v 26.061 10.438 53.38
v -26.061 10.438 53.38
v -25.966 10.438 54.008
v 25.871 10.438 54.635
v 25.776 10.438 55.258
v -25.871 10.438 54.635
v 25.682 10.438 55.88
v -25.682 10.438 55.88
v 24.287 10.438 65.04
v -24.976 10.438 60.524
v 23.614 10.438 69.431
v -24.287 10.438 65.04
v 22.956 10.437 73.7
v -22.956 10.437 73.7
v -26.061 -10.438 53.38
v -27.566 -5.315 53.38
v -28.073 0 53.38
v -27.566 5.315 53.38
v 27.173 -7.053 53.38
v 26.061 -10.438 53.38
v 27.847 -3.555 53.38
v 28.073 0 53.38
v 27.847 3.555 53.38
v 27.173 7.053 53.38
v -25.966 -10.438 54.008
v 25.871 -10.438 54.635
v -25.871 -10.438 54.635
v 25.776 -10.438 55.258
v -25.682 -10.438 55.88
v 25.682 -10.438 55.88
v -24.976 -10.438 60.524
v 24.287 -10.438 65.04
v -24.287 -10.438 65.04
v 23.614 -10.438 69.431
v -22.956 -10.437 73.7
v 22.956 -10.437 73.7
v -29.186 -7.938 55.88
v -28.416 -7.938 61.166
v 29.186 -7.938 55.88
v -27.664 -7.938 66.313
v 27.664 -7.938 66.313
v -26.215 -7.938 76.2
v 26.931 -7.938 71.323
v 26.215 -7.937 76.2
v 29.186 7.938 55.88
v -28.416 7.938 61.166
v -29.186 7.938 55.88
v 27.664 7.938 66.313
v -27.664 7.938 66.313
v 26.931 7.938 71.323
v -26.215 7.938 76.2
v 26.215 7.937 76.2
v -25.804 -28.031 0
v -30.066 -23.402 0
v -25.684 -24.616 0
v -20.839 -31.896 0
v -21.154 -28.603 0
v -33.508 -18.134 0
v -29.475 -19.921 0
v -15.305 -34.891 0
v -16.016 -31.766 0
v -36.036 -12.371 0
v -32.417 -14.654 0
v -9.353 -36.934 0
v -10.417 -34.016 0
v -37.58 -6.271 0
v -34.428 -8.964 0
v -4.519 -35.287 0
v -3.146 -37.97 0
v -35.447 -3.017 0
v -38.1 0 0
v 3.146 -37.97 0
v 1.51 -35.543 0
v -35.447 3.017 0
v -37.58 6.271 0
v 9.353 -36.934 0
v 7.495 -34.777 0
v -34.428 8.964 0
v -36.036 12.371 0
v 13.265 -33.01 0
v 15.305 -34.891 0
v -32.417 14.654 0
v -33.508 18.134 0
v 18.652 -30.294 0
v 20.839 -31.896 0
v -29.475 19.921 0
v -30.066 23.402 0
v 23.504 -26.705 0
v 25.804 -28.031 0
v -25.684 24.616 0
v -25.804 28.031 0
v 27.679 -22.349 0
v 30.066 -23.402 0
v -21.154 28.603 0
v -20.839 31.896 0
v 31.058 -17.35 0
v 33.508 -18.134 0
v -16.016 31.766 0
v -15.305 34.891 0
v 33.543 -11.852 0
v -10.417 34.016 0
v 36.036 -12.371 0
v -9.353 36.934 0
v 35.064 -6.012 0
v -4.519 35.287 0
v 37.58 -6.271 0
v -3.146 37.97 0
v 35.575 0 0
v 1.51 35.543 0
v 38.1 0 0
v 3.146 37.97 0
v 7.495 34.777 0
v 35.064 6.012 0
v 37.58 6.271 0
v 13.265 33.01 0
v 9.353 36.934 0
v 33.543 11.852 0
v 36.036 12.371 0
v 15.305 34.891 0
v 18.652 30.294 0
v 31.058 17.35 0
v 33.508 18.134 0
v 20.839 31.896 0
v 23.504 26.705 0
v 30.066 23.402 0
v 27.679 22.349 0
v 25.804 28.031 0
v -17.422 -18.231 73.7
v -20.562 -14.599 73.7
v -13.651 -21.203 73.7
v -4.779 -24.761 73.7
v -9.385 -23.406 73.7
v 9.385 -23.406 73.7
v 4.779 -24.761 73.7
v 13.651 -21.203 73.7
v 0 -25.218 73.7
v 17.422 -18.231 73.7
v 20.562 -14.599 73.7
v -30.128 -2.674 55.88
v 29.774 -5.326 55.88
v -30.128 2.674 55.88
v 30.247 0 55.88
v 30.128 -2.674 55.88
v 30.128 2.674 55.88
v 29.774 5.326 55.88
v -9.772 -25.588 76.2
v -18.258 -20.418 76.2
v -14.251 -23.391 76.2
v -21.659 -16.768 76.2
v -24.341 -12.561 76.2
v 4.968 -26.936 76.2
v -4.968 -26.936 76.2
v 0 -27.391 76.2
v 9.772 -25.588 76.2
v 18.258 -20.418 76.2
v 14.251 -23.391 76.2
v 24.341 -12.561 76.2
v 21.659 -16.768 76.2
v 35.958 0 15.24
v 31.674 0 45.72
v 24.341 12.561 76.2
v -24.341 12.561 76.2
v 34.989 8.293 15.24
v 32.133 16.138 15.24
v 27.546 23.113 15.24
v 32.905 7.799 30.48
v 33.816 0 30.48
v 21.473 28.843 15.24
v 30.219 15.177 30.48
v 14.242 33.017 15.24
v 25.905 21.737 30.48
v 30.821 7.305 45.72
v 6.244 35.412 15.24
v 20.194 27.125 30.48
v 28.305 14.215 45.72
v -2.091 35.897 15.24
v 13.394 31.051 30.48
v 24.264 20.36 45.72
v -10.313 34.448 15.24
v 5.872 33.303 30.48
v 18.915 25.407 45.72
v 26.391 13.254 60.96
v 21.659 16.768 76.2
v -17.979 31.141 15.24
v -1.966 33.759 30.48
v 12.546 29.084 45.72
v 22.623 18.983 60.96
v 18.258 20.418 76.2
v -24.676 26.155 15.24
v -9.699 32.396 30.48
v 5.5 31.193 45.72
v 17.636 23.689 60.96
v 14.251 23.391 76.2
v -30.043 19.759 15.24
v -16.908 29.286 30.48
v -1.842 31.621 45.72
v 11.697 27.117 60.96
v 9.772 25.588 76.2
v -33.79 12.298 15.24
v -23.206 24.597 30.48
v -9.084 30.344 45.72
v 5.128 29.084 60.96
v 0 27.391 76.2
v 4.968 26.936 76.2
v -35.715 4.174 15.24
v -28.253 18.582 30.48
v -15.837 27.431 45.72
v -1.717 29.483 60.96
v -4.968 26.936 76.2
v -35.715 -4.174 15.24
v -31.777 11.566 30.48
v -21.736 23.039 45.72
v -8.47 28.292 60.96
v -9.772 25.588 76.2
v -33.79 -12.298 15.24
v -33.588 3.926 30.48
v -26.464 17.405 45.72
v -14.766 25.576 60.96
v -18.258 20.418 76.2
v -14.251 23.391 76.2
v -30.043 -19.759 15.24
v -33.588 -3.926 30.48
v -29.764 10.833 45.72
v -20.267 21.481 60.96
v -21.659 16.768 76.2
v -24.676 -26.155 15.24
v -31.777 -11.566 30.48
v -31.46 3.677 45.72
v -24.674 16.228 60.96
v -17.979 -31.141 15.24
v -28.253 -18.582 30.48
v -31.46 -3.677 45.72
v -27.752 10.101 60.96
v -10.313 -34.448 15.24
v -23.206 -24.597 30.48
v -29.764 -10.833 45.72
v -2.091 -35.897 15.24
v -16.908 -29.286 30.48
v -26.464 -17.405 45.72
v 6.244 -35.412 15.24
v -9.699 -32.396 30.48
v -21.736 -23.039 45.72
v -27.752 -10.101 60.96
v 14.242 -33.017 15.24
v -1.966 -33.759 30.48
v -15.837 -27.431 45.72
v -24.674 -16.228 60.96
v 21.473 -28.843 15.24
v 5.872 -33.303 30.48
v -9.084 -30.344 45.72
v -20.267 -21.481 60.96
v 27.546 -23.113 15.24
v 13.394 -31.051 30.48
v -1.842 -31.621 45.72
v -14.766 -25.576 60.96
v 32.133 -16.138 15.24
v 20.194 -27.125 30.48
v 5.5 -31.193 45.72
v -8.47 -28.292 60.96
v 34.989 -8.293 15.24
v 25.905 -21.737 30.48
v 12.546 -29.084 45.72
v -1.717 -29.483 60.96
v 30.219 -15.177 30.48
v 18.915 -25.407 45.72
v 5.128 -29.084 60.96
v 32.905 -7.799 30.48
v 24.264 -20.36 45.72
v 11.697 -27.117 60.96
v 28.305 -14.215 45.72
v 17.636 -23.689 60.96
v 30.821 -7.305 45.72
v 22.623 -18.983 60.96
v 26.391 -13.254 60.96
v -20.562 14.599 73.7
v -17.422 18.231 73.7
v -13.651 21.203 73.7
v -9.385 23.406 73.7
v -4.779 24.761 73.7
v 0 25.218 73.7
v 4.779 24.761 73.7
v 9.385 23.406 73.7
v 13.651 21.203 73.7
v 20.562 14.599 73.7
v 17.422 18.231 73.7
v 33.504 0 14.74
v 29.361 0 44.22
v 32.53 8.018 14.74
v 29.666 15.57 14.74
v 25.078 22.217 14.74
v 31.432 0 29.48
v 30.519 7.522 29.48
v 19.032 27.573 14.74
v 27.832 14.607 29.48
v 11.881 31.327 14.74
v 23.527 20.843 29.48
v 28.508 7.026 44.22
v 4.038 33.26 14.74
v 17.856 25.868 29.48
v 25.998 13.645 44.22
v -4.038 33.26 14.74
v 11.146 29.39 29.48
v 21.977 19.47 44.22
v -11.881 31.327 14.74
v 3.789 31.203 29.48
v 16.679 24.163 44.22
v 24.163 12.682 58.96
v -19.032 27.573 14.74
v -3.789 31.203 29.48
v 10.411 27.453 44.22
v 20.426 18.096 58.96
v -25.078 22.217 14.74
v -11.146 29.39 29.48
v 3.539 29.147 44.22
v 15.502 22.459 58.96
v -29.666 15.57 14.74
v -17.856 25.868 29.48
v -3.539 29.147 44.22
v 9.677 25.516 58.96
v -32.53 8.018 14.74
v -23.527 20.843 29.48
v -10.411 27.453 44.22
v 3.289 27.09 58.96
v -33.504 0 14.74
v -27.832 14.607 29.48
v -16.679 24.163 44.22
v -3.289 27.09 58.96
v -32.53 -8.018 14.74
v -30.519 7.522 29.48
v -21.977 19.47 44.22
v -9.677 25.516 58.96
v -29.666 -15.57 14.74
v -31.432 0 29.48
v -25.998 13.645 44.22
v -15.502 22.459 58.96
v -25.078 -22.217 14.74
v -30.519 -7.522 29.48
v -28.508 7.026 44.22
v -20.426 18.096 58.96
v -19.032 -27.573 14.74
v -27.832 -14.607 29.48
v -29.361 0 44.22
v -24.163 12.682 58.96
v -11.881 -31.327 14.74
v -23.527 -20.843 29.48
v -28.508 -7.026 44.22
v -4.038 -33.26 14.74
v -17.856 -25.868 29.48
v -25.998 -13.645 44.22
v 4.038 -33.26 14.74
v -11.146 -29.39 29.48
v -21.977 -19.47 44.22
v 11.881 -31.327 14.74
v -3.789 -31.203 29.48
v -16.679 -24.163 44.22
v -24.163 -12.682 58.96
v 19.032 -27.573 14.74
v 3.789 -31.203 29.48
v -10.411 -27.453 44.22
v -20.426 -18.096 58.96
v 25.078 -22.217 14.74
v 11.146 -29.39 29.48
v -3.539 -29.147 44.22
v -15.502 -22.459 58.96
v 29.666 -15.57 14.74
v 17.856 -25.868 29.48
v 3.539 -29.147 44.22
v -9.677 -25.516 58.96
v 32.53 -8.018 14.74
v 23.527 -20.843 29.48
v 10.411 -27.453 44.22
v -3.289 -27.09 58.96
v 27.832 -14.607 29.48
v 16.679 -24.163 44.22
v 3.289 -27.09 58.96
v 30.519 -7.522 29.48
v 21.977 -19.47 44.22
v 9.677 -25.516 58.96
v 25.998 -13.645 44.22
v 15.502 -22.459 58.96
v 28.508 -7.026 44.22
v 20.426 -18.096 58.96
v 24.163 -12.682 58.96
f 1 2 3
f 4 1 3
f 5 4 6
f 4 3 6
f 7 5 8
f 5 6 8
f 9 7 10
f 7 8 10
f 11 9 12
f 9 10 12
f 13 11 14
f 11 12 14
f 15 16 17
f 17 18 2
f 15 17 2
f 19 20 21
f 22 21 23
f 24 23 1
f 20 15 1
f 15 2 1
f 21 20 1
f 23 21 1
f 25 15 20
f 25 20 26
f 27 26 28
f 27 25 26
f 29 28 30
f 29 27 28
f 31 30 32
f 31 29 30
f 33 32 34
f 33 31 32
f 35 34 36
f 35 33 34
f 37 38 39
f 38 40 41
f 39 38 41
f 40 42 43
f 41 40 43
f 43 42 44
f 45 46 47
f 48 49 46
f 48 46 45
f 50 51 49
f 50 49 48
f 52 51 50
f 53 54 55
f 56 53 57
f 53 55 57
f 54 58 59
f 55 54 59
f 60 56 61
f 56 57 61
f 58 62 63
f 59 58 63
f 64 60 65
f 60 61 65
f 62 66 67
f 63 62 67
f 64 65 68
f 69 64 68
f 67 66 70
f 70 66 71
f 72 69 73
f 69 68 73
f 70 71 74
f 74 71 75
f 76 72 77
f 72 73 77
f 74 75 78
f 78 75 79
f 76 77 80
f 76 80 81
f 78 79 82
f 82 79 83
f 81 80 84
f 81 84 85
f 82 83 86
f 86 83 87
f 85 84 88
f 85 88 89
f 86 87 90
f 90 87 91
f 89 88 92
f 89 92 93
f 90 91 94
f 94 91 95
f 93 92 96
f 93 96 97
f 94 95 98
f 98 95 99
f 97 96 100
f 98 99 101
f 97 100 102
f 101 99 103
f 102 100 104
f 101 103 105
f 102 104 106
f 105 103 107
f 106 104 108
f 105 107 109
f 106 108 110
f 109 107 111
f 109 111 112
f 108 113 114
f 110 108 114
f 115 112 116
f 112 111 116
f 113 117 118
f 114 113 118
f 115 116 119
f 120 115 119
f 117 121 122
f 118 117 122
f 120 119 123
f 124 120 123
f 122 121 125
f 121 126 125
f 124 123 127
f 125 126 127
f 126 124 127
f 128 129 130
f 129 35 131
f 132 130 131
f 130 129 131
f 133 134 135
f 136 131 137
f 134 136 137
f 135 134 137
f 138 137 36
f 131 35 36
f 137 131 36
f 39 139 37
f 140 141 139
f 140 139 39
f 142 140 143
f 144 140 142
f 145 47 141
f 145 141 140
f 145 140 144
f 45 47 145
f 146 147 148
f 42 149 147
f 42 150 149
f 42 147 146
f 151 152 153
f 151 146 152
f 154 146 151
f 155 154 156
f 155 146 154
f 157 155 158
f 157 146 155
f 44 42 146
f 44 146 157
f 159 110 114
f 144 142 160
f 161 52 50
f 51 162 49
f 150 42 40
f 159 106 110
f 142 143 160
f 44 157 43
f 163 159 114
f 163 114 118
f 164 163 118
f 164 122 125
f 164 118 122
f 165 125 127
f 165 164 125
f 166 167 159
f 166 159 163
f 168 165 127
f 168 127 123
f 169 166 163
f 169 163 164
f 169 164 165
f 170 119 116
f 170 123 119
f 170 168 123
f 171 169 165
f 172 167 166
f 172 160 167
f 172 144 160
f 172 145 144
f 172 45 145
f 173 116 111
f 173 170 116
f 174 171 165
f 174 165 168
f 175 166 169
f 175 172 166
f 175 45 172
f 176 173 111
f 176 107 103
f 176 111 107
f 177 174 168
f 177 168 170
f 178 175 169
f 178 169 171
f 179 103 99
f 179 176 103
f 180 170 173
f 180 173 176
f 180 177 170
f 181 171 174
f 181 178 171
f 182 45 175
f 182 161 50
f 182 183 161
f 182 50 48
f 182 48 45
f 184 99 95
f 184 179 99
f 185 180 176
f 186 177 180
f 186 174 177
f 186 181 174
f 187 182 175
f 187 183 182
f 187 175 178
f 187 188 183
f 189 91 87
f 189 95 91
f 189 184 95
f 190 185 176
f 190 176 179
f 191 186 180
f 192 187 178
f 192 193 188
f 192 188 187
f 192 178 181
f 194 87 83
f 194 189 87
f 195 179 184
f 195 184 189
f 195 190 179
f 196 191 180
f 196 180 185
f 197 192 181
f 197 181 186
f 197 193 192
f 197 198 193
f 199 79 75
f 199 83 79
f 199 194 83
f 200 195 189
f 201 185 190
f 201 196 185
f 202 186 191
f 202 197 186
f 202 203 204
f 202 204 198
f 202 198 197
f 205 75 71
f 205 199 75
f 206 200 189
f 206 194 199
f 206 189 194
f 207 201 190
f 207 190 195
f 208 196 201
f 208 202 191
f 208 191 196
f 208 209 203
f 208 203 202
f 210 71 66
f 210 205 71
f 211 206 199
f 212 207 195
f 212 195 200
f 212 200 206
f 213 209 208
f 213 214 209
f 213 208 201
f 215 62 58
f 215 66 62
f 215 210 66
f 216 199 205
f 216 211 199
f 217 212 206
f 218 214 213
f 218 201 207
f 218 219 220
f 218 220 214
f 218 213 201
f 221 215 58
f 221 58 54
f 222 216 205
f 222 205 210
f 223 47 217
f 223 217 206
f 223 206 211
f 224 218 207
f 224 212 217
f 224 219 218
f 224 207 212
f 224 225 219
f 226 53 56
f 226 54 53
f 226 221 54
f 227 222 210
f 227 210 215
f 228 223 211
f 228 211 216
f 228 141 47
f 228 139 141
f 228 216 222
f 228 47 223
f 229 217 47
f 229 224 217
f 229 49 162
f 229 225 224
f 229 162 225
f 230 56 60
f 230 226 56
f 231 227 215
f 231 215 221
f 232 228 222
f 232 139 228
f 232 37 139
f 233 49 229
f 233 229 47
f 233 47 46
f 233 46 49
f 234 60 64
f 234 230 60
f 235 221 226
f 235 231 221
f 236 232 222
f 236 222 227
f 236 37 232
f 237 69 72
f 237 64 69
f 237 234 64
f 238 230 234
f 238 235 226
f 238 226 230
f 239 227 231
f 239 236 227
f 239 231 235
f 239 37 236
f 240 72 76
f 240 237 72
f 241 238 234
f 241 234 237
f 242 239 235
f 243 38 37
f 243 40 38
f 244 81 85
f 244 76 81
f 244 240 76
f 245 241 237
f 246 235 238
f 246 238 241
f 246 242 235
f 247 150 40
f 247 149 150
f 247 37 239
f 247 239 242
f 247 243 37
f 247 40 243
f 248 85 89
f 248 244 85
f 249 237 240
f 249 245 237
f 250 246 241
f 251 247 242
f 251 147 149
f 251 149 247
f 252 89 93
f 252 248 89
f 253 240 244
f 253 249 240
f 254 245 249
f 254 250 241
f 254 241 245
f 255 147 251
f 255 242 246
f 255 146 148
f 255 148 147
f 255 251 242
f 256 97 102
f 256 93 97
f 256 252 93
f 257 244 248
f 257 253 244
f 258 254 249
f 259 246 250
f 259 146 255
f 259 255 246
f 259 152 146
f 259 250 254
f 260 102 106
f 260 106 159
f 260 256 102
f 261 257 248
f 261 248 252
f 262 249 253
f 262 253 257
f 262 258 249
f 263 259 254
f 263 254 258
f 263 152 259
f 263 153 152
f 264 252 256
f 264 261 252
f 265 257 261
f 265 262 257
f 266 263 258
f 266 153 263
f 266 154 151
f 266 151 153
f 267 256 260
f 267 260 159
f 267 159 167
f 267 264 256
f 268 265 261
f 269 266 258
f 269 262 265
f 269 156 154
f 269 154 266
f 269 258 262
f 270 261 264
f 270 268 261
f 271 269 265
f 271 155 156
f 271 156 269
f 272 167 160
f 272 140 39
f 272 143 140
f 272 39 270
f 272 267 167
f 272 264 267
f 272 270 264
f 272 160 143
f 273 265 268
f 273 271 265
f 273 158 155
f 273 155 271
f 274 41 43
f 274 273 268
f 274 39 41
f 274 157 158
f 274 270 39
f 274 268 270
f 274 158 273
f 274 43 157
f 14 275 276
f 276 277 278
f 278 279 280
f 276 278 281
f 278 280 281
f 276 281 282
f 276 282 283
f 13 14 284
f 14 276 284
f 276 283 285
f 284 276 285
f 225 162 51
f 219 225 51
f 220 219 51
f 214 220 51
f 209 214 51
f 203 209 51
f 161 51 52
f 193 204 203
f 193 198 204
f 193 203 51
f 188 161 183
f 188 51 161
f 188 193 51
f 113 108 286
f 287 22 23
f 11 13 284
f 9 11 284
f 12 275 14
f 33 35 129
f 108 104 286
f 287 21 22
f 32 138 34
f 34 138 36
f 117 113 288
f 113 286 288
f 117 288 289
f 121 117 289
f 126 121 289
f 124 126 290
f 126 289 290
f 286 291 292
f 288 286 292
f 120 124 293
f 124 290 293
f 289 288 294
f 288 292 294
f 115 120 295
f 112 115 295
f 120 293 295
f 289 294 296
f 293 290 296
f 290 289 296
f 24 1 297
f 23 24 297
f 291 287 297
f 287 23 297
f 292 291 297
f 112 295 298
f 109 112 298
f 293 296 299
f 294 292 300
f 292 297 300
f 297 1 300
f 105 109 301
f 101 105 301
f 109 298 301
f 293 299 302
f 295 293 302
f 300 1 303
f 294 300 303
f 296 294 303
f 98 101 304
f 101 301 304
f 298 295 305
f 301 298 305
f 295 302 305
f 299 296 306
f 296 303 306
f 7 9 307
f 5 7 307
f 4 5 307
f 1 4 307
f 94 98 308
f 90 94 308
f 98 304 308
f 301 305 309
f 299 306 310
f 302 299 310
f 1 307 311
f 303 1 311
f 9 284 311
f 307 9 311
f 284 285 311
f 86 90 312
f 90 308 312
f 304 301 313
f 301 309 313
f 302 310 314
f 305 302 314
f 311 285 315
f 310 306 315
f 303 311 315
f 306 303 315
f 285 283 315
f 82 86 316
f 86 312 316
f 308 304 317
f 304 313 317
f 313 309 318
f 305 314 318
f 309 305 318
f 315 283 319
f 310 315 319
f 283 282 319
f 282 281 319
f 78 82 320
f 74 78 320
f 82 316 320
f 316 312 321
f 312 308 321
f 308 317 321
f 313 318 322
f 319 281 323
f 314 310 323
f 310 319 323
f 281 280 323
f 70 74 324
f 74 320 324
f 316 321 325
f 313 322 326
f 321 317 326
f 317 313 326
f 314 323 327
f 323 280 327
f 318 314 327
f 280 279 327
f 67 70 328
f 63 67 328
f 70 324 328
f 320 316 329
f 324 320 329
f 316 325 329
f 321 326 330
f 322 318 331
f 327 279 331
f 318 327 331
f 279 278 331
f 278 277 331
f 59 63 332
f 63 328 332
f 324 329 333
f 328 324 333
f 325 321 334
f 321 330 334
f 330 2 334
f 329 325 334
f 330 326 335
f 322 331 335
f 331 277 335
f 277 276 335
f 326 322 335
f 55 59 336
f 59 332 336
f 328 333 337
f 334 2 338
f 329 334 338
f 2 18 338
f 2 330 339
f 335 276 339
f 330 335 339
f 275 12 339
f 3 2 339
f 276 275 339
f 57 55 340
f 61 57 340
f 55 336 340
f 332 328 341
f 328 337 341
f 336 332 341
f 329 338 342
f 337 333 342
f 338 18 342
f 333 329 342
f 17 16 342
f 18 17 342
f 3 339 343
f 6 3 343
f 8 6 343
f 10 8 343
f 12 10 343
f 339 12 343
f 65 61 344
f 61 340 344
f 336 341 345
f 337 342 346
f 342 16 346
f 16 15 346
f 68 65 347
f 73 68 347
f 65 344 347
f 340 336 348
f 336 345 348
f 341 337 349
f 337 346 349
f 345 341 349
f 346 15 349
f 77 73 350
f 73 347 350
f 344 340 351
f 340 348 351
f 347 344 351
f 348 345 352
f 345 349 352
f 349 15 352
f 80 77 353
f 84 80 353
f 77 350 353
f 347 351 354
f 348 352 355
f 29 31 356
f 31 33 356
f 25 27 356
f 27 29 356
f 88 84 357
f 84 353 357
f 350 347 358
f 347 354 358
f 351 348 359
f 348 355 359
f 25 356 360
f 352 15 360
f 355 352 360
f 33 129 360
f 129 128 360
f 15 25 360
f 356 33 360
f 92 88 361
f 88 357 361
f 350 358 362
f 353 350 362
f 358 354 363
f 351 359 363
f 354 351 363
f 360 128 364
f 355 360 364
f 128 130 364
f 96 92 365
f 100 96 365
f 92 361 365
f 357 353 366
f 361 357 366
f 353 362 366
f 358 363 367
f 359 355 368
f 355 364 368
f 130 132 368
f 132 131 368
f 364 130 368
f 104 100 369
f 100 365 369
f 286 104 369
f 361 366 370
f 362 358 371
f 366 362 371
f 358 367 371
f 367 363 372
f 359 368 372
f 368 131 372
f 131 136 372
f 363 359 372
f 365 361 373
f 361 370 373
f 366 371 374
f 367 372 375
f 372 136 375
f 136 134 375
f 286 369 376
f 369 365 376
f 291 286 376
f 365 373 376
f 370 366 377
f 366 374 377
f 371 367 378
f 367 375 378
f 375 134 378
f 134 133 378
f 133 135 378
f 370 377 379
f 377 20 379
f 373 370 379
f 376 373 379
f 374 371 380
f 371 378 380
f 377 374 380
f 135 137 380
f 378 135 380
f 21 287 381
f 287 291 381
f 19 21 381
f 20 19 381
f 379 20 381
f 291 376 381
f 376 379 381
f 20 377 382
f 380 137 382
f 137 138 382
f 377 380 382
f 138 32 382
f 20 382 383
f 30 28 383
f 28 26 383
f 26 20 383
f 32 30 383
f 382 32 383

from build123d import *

# Parameters (mm, degrees)
F0_R        = 38.1
F1_DEPTH    = 76.2
F1_TAPER    = 8
F2_W        = 127
F2_H        = 15.875
F3_DEPTH    = 20.32
F4_T        = 2.5
F4_T3_DEPTH = 63.3729932057


# Not quite as in the source:
# - a shell that OpenCascade refuses in one call is made with other operations: the cavity is built on its own and cut out


with BuildPart() as f1:
    # F0 (on Top) → F1 (new body)
    with BuildSketch(Plane.XY):
        Circle(F0_R)
    extrude(amount=F1_DEPTH, taper=F1_TAPER)

    # F2 (on face) → F3 (cut)
    with BuildSketch(Plane.XY.offset(76.2)):
        Rectangle(F2_W, F2_H)
    extrude(amount=-F3_DEPTH, mode=Mode.SUBTRACT)

    # F4: shell of thickness 2.5, made by hand


with BuildPart() as f4_core1:
    # F4_t2: copy of F1
    add(f1.part)

    # the walls: a layer under each face that stays
    f4_faces = [f4_core1.faces().sort_by_distance(p)[0] for p in [
        (-32.7453941978, 0, 38.1),
        (0, 0, 55.88),
        (0, 7.9375, 66.04),
        (0, 17.6641441978, 76.2),
        (0, -7.9375, 66.04),
        (0, -17.6641441978, 76.2),
    ]]
    thicken(f4_faces, amount=-F4_T, mode=Mode.SUBTRACT)

    # F4_s4 → F4_t3 (cut)
    with BuildSketch(Plane.YZ.offset(-31.6864966028)):
        Polygon((7.9125, 55.905), (7.9375, 53.38), (10.4375, 53.38), (10.4375, 55.88), align=None)
        Polygon((-7.9125, 55.905), (-7.9375, 53.38), (-10.4375, 53.38), (-10.4375, 55.88), align=None)
    extrude(amount=F4_T3_DEPTH, mode=Mode.SUBTRACT)


with BuildPart() as f1_1:
    add(f1.part)

    # what is left inside the walls is the cavity
    f4_cavity = [f4_core1.part.solids().sort_by_distance(p)[0] for p in [
        (-32.098055, 0, 24.563187),
    ]]
    add(f4_cavity, mode=Mode.SUBTRACT)


solid = f1_1.part
